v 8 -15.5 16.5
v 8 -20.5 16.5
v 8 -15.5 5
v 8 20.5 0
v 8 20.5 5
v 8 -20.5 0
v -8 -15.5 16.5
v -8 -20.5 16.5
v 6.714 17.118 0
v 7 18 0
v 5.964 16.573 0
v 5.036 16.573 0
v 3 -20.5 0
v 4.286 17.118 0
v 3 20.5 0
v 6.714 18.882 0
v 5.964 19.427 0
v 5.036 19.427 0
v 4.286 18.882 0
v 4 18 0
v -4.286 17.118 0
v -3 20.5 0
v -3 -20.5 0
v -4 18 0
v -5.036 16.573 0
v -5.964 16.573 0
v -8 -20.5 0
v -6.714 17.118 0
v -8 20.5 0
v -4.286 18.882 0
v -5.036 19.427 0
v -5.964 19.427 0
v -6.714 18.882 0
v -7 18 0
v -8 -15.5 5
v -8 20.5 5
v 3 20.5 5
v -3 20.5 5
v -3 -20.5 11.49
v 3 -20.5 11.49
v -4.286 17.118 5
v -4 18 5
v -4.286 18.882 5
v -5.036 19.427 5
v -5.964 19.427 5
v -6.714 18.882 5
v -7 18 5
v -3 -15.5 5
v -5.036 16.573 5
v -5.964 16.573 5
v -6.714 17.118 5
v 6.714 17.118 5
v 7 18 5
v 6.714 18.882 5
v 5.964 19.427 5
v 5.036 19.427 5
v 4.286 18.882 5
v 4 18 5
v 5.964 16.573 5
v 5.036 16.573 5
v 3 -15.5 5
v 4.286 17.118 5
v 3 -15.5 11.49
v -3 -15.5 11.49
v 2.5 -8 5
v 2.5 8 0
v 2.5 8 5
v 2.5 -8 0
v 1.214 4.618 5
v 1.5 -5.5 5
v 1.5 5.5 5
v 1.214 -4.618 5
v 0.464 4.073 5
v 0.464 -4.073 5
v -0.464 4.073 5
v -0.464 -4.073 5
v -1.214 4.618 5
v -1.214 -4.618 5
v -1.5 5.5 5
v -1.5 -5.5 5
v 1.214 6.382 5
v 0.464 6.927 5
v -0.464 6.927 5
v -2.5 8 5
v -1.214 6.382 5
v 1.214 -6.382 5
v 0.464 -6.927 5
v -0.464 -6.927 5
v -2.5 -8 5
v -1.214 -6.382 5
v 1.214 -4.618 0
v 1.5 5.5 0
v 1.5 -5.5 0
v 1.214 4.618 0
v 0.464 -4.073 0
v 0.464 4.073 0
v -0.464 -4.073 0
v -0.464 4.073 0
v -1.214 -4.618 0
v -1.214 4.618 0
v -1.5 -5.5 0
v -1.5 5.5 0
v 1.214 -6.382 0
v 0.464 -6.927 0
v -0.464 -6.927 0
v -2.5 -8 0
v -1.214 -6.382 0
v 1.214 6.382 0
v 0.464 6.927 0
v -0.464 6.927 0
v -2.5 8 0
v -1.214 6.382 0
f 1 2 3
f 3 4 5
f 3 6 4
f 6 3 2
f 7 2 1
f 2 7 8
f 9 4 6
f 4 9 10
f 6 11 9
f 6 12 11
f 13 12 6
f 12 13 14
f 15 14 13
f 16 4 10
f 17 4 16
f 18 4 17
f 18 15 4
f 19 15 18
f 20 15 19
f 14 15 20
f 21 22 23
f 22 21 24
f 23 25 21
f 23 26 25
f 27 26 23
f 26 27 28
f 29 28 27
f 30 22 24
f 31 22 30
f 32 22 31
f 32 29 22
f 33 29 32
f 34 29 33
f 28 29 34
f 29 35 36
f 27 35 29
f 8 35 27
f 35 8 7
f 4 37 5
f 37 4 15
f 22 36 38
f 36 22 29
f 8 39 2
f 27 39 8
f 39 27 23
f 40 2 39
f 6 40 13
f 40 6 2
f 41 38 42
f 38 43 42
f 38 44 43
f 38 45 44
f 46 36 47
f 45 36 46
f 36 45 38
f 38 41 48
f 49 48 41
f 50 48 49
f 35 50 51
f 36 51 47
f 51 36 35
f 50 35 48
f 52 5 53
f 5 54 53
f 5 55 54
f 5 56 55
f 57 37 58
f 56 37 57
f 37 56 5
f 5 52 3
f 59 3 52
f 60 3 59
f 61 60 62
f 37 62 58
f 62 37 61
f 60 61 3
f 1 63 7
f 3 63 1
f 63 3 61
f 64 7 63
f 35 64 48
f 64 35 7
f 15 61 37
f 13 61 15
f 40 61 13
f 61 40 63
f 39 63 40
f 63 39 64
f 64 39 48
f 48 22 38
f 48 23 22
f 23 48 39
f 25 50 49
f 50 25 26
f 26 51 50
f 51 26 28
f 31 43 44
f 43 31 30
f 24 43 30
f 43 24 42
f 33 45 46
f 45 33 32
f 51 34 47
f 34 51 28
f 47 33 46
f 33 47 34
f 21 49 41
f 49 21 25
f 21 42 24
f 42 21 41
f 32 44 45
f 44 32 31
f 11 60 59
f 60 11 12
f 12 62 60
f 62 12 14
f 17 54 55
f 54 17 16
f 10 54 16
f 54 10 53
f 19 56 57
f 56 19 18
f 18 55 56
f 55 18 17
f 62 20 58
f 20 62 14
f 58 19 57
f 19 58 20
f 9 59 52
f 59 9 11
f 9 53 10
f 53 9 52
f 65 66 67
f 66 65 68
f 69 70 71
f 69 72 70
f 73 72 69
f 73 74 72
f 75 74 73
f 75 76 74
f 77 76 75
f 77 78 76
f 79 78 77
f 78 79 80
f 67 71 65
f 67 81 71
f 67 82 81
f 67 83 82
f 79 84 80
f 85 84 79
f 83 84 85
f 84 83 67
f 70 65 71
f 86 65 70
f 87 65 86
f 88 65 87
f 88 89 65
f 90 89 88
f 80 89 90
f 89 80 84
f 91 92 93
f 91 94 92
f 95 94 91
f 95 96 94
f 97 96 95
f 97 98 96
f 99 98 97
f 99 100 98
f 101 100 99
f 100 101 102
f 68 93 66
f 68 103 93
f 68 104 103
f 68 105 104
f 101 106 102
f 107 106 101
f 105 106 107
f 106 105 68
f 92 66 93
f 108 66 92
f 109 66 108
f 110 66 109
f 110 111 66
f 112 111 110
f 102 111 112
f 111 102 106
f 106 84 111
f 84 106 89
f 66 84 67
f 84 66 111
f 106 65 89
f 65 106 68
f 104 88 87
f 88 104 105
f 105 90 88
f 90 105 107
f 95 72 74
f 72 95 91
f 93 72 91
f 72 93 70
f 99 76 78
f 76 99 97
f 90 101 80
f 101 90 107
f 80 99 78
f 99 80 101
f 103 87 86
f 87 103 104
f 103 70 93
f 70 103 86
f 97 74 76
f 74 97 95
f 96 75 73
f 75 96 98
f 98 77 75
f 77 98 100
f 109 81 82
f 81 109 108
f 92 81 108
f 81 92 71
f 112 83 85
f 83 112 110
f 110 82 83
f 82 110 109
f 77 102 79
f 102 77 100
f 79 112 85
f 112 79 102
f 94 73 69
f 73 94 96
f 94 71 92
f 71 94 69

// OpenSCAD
belt_width = 6;
bolt_diameter = 3;
thickness = 5;
belt_clearance = 5.5;
rod_clearance = 6.5;
lenght = 31 + 2*thickness;
a = 6.5;

width = belt_width + 2*thickness;
height = thickness*2 + a;
bolt_clearance = thickness/2;

module bolt(placement){
  translate(placement+[0, 0, -height]) cylinder(r=bolt_diameter/2, h=height*2, $fn=10);
}

translate([-width/2, -lenght/2, 0]) difference(){
  cube([width, lenght, height]);
  translate([-1, thickness, thickness]) cube([width*2, lenght, height]);
  translate([thickness, -.01, -.01]) cube([belt_width, lenght+1, height-thickness]);
  bolt([bolt_clearance, lenght-bolt_clearance, 0]);
  bolt([width-bolt_clearance, lenght-bolt_clearance, 0]);
}

translate([-thickness/2, -width/2, 0]) 
difference(){
  cube([thickness, width, thickness], 0);
  bolt([bolt_clearance, bolt_clearance, 0]);
  bolt([bolt_clearance, width-bolt_clearance, 0]);
}

echo(str("Required bolt lenght about ", height+2));
